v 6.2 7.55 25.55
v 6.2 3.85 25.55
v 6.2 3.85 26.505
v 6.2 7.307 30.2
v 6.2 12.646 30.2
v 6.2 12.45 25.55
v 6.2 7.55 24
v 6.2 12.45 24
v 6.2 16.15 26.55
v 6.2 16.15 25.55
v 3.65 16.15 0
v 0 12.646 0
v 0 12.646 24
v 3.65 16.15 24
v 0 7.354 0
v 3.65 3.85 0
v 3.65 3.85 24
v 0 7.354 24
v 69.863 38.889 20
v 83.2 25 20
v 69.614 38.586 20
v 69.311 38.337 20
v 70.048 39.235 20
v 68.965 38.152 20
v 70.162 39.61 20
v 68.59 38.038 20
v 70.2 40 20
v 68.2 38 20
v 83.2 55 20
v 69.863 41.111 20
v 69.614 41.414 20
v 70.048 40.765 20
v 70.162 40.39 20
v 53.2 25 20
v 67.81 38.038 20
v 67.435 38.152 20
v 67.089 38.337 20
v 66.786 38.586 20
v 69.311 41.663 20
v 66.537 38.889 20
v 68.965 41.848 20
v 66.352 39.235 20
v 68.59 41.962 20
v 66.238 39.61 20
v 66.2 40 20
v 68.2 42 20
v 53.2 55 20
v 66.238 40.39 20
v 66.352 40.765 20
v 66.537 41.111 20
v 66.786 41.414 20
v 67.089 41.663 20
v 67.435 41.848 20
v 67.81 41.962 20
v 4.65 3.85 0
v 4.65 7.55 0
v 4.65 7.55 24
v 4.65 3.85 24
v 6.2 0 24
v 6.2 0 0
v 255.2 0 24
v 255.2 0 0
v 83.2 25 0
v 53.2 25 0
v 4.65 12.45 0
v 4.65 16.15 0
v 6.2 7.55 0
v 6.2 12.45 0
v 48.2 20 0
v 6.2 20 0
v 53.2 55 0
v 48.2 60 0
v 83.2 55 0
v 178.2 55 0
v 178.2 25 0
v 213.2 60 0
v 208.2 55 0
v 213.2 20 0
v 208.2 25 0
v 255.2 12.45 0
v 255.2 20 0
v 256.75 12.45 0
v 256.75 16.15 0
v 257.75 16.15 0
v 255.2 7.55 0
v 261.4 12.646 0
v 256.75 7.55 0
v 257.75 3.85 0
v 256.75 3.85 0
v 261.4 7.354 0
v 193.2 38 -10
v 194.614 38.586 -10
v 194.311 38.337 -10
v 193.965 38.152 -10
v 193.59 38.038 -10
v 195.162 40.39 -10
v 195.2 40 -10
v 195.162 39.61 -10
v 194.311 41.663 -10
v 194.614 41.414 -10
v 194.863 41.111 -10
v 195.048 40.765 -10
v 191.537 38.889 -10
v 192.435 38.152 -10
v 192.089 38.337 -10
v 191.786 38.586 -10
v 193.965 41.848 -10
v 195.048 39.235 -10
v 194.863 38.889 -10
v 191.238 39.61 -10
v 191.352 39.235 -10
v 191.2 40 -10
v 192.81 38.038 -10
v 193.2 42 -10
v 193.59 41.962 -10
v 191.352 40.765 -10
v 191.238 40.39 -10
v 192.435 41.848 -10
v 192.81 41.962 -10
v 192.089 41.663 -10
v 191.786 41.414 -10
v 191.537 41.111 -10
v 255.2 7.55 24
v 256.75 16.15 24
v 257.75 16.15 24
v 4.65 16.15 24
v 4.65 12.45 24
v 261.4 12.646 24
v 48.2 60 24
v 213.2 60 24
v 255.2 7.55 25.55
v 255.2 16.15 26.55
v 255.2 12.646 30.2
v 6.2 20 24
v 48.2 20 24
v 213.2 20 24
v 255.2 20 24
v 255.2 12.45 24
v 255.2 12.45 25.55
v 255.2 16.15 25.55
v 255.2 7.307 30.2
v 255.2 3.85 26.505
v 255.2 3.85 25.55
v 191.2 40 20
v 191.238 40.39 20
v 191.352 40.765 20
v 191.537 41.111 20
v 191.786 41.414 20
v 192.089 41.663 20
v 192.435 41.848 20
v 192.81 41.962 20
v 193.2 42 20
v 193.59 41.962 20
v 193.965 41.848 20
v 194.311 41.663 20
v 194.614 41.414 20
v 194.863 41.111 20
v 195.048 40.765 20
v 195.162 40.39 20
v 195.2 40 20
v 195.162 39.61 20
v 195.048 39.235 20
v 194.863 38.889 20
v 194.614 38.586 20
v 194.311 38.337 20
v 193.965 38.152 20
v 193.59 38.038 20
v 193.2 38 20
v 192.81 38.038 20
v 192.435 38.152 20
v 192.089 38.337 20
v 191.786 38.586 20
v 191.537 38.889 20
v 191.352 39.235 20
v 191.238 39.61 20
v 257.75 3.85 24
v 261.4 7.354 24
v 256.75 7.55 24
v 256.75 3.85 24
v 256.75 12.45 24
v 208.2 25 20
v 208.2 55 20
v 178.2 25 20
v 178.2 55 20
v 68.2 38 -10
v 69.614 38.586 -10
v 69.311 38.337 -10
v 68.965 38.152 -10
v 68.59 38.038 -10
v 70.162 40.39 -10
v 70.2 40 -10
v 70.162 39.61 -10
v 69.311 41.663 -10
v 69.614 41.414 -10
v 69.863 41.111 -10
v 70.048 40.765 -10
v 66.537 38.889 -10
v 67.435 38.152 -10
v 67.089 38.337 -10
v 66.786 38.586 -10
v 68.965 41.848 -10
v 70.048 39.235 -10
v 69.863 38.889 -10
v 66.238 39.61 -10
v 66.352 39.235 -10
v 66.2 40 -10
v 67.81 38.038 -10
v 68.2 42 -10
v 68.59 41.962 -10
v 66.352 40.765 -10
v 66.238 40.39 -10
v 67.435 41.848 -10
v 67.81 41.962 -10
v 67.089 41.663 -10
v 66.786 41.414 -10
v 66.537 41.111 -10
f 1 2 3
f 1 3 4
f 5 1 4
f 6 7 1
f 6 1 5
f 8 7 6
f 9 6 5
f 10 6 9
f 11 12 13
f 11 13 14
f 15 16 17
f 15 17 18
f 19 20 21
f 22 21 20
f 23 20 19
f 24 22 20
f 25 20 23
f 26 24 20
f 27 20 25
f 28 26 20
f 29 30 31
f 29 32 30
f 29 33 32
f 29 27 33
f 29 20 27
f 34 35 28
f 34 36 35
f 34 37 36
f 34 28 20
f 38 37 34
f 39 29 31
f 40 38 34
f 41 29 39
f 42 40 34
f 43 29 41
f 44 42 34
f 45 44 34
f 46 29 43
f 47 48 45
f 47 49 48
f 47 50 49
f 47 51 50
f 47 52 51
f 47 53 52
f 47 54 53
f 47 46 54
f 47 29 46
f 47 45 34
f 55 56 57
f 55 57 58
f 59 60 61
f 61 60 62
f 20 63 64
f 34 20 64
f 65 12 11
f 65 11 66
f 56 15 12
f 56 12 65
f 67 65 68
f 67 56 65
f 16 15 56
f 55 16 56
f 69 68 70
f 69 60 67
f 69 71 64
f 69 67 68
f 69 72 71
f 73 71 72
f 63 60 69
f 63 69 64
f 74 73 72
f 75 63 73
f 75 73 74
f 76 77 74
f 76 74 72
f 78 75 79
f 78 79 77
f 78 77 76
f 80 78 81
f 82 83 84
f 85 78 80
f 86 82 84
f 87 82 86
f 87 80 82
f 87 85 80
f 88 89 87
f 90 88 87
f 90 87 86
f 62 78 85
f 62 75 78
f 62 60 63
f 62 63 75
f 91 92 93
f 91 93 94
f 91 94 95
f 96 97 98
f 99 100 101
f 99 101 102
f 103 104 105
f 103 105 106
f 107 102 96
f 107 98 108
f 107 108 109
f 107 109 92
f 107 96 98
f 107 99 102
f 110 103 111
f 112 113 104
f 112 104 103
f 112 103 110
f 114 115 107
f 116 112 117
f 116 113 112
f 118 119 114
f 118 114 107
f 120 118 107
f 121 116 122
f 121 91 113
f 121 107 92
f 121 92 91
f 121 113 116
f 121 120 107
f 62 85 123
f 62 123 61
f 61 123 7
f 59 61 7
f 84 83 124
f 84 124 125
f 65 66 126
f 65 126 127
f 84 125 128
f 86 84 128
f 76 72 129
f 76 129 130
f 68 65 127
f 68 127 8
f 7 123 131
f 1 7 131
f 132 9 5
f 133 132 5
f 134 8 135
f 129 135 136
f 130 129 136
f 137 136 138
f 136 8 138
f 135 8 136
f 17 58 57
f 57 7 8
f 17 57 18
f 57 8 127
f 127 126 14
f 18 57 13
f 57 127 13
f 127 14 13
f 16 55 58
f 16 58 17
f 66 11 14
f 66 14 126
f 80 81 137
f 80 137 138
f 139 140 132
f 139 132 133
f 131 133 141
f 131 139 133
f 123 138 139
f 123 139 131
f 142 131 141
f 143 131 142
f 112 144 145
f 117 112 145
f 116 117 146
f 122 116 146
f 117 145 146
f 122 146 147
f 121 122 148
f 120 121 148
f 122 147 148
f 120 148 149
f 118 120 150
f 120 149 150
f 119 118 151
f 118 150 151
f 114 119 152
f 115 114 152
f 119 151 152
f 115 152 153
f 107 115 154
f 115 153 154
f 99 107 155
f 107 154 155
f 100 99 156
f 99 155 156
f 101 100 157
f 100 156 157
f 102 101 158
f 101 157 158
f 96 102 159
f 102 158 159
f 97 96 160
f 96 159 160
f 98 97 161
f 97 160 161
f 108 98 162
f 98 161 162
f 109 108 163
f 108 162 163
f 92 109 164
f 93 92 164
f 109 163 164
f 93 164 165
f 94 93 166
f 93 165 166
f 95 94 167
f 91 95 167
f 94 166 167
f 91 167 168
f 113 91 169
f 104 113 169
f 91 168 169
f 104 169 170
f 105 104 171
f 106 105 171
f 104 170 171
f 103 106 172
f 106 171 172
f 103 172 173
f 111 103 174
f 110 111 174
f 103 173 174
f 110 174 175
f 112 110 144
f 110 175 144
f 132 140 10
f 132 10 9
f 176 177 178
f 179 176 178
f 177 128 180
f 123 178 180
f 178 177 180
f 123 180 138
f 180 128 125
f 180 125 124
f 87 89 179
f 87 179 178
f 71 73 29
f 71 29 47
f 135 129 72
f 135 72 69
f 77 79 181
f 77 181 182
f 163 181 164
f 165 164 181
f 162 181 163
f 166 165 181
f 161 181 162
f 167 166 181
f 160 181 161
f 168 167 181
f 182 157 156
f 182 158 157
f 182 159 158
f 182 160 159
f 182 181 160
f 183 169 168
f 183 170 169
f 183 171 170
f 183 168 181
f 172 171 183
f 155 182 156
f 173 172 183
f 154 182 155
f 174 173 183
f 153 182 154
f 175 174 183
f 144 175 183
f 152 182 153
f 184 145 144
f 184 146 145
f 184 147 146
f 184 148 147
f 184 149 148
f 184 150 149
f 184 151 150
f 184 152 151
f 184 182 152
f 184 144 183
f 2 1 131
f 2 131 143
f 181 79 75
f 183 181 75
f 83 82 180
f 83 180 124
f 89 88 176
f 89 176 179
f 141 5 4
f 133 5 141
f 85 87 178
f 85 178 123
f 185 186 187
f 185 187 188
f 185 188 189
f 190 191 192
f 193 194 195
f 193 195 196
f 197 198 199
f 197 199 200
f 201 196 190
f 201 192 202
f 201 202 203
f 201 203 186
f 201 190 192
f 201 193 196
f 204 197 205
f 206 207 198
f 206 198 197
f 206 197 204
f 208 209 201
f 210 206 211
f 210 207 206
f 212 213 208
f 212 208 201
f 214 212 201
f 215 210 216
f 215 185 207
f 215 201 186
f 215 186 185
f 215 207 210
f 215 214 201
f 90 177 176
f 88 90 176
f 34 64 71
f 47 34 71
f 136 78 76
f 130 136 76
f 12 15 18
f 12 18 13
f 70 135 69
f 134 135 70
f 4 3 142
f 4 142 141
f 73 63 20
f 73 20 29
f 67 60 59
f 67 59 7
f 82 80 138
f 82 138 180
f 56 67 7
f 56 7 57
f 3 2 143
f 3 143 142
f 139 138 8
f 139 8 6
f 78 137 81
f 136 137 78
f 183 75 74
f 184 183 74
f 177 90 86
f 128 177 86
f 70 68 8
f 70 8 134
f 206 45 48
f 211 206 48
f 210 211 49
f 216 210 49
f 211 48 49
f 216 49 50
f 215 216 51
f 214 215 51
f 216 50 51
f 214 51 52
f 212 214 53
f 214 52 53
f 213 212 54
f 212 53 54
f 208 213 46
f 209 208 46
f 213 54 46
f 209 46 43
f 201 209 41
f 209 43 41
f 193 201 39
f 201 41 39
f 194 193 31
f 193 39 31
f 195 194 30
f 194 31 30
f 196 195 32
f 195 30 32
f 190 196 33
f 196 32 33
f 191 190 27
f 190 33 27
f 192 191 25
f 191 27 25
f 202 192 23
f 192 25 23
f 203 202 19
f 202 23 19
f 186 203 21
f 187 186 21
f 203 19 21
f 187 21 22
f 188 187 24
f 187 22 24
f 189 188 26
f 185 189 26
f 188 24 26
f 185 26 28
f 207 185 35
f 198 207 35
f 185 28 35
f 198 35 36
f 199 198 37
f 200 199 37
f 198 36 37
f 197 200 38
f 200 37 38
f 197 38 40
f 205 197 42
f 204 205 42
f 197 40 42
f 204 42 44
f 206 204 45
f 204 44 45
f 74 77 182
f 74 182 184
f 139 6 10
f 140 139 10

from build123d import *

# Parameters (mm, degrees)
ESQUISSE1_W                   = 261.4
ESQUISSE1_H                   = 50
BOSS_EXTRU_1_DEPTH            = 30.2
ENL_V_MAT_EXTRU_3_DEPTH       = 268.846971235
ENL_V_MAT_EXTRU_3_DEPTH_BACK  = 6.2
ENL_V_MAT_EXTRU_4_DEPTH       = 268.846971235
ENL_V_MAT_EXTRU_4_DEPTH_BACK  = 6.2
ENL_V_MAT_EXTRU_6_DEPTH       = 268.846971235
ENL_V_MAT_EXTRU_6_DEPTH_BACK  = 6.2
ENL_V_MAT_EXTRU_7_DEPTH       = 262.799694423
ENL_V_MAT_EXTRU_7_DEPTH_BACK  = 249
ENL_V_MAT_EXTRU_9_DEPTH       = 262.799694423
ENL_V_MAT_EXTRU_9_DEPTH_BACK  = 249
ENL_V_MAT_EXTRU_11_DEPTH      = 268.846971235
ENL_V_MAT_EXTRU_11_DEPTH_BACK = 24
ENL_V_MAT_EXTRU_12_DEPTH      = 268.846971235
ENL_V_MAT_EXTRU_12_DEPTH_BACK = 24
ENL_V_MAT_EXTRU_13_DEPTH      = 268.218936455
ENL_V_MAT_EXTRU_13_DEPTH_BACK = 24
ENL_V_MAT_EXTRU_14_DEPTH      = 268.218936455
ENL_V_MAT_EXTRU_14_DEPTH_BACK = 24
ENL_V_MAT_EXTRU_15_DEPTH      = 268.218936455
ENL_V_MAT_EXTRU_15_DEPTH_BACK = 24
ENL_V_MAT_EXTRU_16_DEPTH      = 268.218936455
ENL_V_MAT_EXTRU_16_DEPTH_BACK = 24
ESQUISSE22_W                  = 220
ESQUISSE22_H                  = 24
BOSS_EXTRU_2_DEPTH            = 10
ESQUISSE23_W                  = 15
ESQUISSE23_H                  = 40
ENL_V_MAT_EXTRU_18_DEPTH      = 24
ESQUISSE24_W                  = 12.5
ESQUISSE24_H                  = 40
ENL_V_MAT_EXTRU_24_DEPTH      = 30
ENL_V_MAT_EXTRU_25_DEPTH      = 270.89257122
ENL_V_MAT_EXTRU_25_DEPTH_BACK = 30
ESQUISSE33_W                  = 30
ESQUISSE33_H                  = 30
ENL_V_MAT_EXTRU_26_DEPTH      = 20
ESQUISSE34_R                  = 2
BOSS_EXTRU_6_DEPTH            = 30
ESQUISSE35_W                  = 30
ESQUISSE35_H                  = 30
ENL_V_MAT_EXTRU_27_DEPTH      = 20
ESQUISSE36_R                  = 2
BOSS_EXTRU_7_DEPTH            = 30


with BuildPart() as part:
    # Esquisse1 → Boss.-Extru.1 (new body)
    with BuildSketch(Plane.XY):
        with Locations((130.7, 25)):
            Rectangle(ESQUISSE1_W, ESQUISSE1_H)
    extrude(amount=BOSS_EXTRU_1_DEPTH)

    # Esquisse2 → Enlèv. mat.-Extru.3 (cut, two sides: drawn at the far end of the back side and taken through both)
    with BuildSketch(Plane.XY.offset(30.2).offset(-ENL_V_MAT_EXTRU_3_DEPTH_BACK)):
        Polygon((797.631736025, 20), (261.4, 20), (0, 20), (-536.231736025, 20), (-536.231736025, 1092.46347205), (797.631736025, 1092.46347205), align=None)
    extrude(amount=ENL_V_MAT_EXTRU_3_DEPTH + ENL_V_MAT_EXTRU_3_DEPTH_BACK, mode=Mode.SUBTRACT)

    # Esquisse5 → Enlèv. mat.-Extru.4 (cut, two sides: drawn at the far end of the back side and taken through both)
    with BuildSketch(Plane.XY.offset(30.2).offset(-ENL_V_MAT_EXTRU_4_DEPTH_BACK)):
        Polygon((6.2, -530.103989602), (6.2, 0), (6.2, 20), (6.2, 550.103989602), (-1054.007979204, 550.103989602), (-1054.007979204, -530.103989602), align=None)
    extrude(amount=ENL_V_MAT_EXTRU_4_DEPTH + ENL_V_MAT_EXTRU_4_DEPTH_BACK, mode=Mode.SUBTRACT)

    # Esquisse6 → Enlèv. mat.-Extru.6 (cut, two sides: drawn at the far end of the back side and taken through both)
    with BuildSketch(Plane.XY.offset(30.2).offset(-ENL_V_MAT_EXTRU_6_DEPTH_BACK)):
        Polygon((255.2, 550.103989602), (255.2, 20), (255.2, 0), (255.2, -530.103989602), (1315.407979204, -530.103989602), (1315.407979204, 550.103989602), align=None)
    extrude(amount=ENL_V_MAT_EXTRU_6_DEPTH + ENL_V_MAT_EXTRU_6_DEPTH_BACK, mode=Mode.SUBTRACT)

    # Esquisse8 → Enlèv. mat.-Extru.7 (cut, two sides: drawn at the far end of the back side and taken through both)
    with BuildSketch(Plane(origin=(255.2, 0, 0), x_dir=(0, 0, -1), z_dir=(1, 0, 0)).offset(-ENL_V_MAT_EXTRU_7_DEPTH_BACK)):
        Polygon((-24, -120.923396991), (-24, 0), (-24, 7.55), (-25.55, 7.55), (-25.55, 3.85), (-26.504639672, 3.85), (-30.2, 7.30657519), (-118.511368381, 89.911479128), (-339.199142385, -9.016667344), (-244.687774004, -219.851543463), align=None)
    extrude(amount=ENL_V_MAT_EXTRU_7_DEPTH + ENL_V_MAT_EXTRU_7_DEPTH_BACK, mode=Mode.SUBTRACT)

    # Esquisse9 → Enlèv. mat.-Extru.9 (cut, two sides: drawn at the far end of the back side and taken through both)
    with BuildSketch(Plane(origin=(255.2, 0, 0), x_dir=(0, 0, -1), z_dir=(1, 0, 0)).offset(-ENL_V_MAT_EXTRU_9_DEPTH_BACK)):
        Polygon((-24, 126.070686284), (-24, 20), (-24, 12.45), (-25.55, 12.45), (-25.55, 16.15), (-26.55, 16.15), (-30.2, 12.645559959), (-106.713439711, -60.816566558), (-300.704336754, 25.040837428), (-217.990897044, 211.92809027), align=None)
    extrude(amount=ENL_V_MAT_EXTRU_9_DEPTH + ENL_V_MAT_EXTRU_9_DEPTH_BACK, mode=Mode.SUBTRACT)

    # Esquisse10 → Enlèv. mat.-Extru.11 (cut, two sides: drawn at the far end of the back side and taken through both)
    with BuildSketch(Plane(origin=(0, 0, 0), x_dir=(-1, 0, 0), z_dir=(0, 0, -1)).offset(-ENL_V_MAT_EXTRU_11_DEPTH_BACK)):
        Polygon((536.231736025, 20), (0, 20), (-20.7, 20), (-20.7, 50), (-20.7, 586.231736025), (743.899228974, 1338.272903737), (1300.830964999, 772.041167712), align=None)
    extrude(amount=ENL_V_MAT_EXTRU_11_DEPTH + ENL_V_MAT_EXTRU_11_DEPTH_BACK, mode=Mode.SUBTRACT)

    # Esquisse11 → Enlèv. mat.-Extru.12 (cut, two sides: drawn at the far end of the back side and taken through both)
    with BuildSketch(Plane(origin=(0, 0, 0), x_dir=(-1, 0, 0), z_dir=(0, 0, -1)).offset(-ENL_V_MAT_EXTRU_12_DEPTH_BACK)):
        Polygon((-797.631736025, 20), (-261.4, 20), (-240.7, 20), (-240.7, 50), (-240.7, 586.231736025), (-1005.299228974, 1338.272903737), (-1562.230964999, 772.041167712), align=None)
    extrude(amount=ENL_V_MAT_EXTRU_12_DEPTH + ENL_V_MAT_EXTRU_12_DEPTH_BACK, mode=Mode.SUBTRACT)

    # Esquisse12 → Enlèv. mat.-Extru.13 (cut, two sides: drawn at the far end of the back side and taken through both)
    with BuildSketch(Plane.XY.offset(24).offset(-ENL_V_MAT_EXTRU_13_DEPTH_BACK)):
        Polygon((6.2, 0), (6.2, 7.55), (4.65, 7.55), (4.65, 3.85), (3.65, 3.85), (0, 7.354440041), (0, 0), align=None)
    extrude(amount=ENL_V_MAT_EXTRU_13_DEPTH + ENL_V_MAT_EXTRU_13_DEPTH_BACK, mode=Mode.SUBTRACT)

    # Esquisse13 → Enlèv. mat.-Extru.14 (cut, two sides: drawn at the far end of the back side and taken through both)
    with BuildSketch(Plane.XY.offset(24).offset(-ENL_V_MAT_EXTRU_14_DEPTH_BACK)):
        Polygon((-388.163092547, -360.037805495), (0, 12.645559959), (3.65, 16.15), (4.65, 16.15), (4.65, 12.45), (6.2, 12.45), (6.2, 20), (6.2, 558.111026928), (-982.664286619, 982.847806423), (-1377.027379166, 64.698974), align=None)
    extrude(amount=ENL_V_MAT_EXTRU_14_DEPTH + ENL_V_MAT_EXTRU_14_DEPTH_BACK, mode=Mode.SUBTRACT)

    # Esquisse16 → Enlèv. mat.-Extru.15 (cut, two sides: drawn at the far end of the back side and taken through both)
    with BuildSketch(Plane.XY.offset(24).offset(-ENL_V_MAT_EXTRU_15_DEPTH_BACK)):
        Polygon((255.2, 20), (255.2, 12.45), (256.75, 12.45), (256.75, 16.15), (257.75, 16.15), (261.4, 12.645559959), (261.4, 20), align=None)
    extrude(amount=ENL_V_MAT_EXTRU_15_DEPTH + ENL_V_MAT_EXTRU_15_DEPTH_BACK, mode=Mode.SUBTRACT)

    # Esquisse17 → Enlèv. mat.-Extru.16 (cut, two sides: drawn at the far end of the back side and taken through both)
    with BuildSketch(Plane.XY.offset(24).offset(-ENL_V_MAT_EXTRU_16_DEPTH_BACK)):
        Polygon((650.717680613, 381.146349234), (261.4, 7.354440041), (257.75, 3.85), (256.75, 3.85), (256.75, 7.55), (255.2, 7.55), (255.2, 0), (255.2, -539.711633945), (1247.009188557, -965.703564334), (1642.52686917, -44.845581155), align=None)
    extrude(amount=ENL_V_MAT_EXTRU_16_DEPTH + ENL_V_MAT_EXTRU_16_DEPTH_BACK, mode=Mode.SUBTRACT)

    # Esquisse22 → Boss.-Extru.2 (add)
    with BuildSketch(Plane(origin=(0, 50, 0), x_dir=(1, 0, 0), z_dir=(0, 1, 0))):
        with Locations((130.7, -12)):
            Rectangle(ESQUISSE22_W, ESQUISSE22_H)
    extrude(amount=BOSS_EXTRU_2_DEPTH)

    # Esquisse23 → Enlèv. mat.-Extru.18 (cut)
    with BuildSketch(Plane(origin=(0, 0, 0), x_dir=(-1, 0, 0), z_dir=(0, 0, -1))):
        with Locations((-233.2, 40)):
            Rectangle(ESQUISSE23_W, ESQUISSE23_H)
    extrude(amount=-ENL_V_MAT_EXTRU_18_DEPTH, mode=Mode.SUBTRACT)

    # Esquisse24 → Enlèv. mat.-Extru.24 (cut)
    with BuildSketch(Plane(origin=(0, 0, 0), x_dir=(-1, 0, 0), z_dir=(0, 0, -1))):
        with Locations((-219.45, 40)):
            Rectangle(ESQUISSE24_W, ESQUISSE24_H)
    extrude(amount=-ENL_V_MAT_EXTRU_24_DEPTH, mode=Mode.SUBTRACT)

    # Esquisse32 → Enlèv. mat.-Extru.25 (cut, two sides: drawn at the far end of the back side and taken through both)
    with BuildSketch(Plane(origin=(0, 0, 0), x_dir=(-1, 0, 0), z_dir=(0, 0, -1)).offset(-ENL_V_MAT_EXTRU_25_DEPTH_BACK)):
        Polygon((477.302008193, 20), (-20.7, 20), (-48.2, 20), (-48.2, 60), (-48.2, 558.002008193), (664.309819102, 1253.957292919), (1189.811827295, 715.955284726), align=None)
    extrude(amount=ENL_V_MAT_EXTRU_25_DEPTH + ENL_V_MAT_EXTRU_25_DEPTH_BACK, mode=Mode.SUBTRACT)

    # Esquisse33 → Enlèv. mat.-Extru.26 (cut)
    with BuildSketch(Plane(origin=(0, 0, 0), x_dir=(-1, 0, 0), z_dir=(0, 0, -1))):
        with Locations((-193.2, 40)):
            Rectangle(ESQUISSE33_W, ESQUISSE33_H)
    extrude(amount=-ENL_V_MAT_EXTRU_26_DEPTH, mode=Mode.SUBTRACT)

    # Esquisse34 → Boss.-Extru.6 (add)
    with BuildSketch(Plane(origin=(0, 0, 20), x_dir=(-1, 0, 0), z_dir=(0, 0, -1))):
        with Locations((-193.2, 40)):
            Circle(ESQUISSE34_R)
    extrude(amount=BOSS_EXTRU_6_DEPTH)

    # Esquisse35 → Enlèv. mat.-Extru.27 (cut)
    with BuildSketch(Plane(origin=(0, 0, 0), x_dir=(-1, 0, 0), z_dir=(0, 0, -1))):
        with Locations((-68.2, 40)):
            Rectangle(ESQUISSE35_W, ESQUISSE35_H)
    extrude(amount=-ENL_V_MAT_EXTRU_27_DEPTH, mode=Mode.SUBTRACT)

    # Esquisse36 → Boss.-Extru.7 (add)
    with BuildSketch(Plane(origin=(0, 0, 20), x_dir=(-1, 0, 0), z_dir=(0, 0, -1))):
        with Locations((-68.2, 40)):
            Circle(ESQUISSE36_R)
    extrude(amount=BOSS_EXTRU_7_DEPTH)


solid = part.part
